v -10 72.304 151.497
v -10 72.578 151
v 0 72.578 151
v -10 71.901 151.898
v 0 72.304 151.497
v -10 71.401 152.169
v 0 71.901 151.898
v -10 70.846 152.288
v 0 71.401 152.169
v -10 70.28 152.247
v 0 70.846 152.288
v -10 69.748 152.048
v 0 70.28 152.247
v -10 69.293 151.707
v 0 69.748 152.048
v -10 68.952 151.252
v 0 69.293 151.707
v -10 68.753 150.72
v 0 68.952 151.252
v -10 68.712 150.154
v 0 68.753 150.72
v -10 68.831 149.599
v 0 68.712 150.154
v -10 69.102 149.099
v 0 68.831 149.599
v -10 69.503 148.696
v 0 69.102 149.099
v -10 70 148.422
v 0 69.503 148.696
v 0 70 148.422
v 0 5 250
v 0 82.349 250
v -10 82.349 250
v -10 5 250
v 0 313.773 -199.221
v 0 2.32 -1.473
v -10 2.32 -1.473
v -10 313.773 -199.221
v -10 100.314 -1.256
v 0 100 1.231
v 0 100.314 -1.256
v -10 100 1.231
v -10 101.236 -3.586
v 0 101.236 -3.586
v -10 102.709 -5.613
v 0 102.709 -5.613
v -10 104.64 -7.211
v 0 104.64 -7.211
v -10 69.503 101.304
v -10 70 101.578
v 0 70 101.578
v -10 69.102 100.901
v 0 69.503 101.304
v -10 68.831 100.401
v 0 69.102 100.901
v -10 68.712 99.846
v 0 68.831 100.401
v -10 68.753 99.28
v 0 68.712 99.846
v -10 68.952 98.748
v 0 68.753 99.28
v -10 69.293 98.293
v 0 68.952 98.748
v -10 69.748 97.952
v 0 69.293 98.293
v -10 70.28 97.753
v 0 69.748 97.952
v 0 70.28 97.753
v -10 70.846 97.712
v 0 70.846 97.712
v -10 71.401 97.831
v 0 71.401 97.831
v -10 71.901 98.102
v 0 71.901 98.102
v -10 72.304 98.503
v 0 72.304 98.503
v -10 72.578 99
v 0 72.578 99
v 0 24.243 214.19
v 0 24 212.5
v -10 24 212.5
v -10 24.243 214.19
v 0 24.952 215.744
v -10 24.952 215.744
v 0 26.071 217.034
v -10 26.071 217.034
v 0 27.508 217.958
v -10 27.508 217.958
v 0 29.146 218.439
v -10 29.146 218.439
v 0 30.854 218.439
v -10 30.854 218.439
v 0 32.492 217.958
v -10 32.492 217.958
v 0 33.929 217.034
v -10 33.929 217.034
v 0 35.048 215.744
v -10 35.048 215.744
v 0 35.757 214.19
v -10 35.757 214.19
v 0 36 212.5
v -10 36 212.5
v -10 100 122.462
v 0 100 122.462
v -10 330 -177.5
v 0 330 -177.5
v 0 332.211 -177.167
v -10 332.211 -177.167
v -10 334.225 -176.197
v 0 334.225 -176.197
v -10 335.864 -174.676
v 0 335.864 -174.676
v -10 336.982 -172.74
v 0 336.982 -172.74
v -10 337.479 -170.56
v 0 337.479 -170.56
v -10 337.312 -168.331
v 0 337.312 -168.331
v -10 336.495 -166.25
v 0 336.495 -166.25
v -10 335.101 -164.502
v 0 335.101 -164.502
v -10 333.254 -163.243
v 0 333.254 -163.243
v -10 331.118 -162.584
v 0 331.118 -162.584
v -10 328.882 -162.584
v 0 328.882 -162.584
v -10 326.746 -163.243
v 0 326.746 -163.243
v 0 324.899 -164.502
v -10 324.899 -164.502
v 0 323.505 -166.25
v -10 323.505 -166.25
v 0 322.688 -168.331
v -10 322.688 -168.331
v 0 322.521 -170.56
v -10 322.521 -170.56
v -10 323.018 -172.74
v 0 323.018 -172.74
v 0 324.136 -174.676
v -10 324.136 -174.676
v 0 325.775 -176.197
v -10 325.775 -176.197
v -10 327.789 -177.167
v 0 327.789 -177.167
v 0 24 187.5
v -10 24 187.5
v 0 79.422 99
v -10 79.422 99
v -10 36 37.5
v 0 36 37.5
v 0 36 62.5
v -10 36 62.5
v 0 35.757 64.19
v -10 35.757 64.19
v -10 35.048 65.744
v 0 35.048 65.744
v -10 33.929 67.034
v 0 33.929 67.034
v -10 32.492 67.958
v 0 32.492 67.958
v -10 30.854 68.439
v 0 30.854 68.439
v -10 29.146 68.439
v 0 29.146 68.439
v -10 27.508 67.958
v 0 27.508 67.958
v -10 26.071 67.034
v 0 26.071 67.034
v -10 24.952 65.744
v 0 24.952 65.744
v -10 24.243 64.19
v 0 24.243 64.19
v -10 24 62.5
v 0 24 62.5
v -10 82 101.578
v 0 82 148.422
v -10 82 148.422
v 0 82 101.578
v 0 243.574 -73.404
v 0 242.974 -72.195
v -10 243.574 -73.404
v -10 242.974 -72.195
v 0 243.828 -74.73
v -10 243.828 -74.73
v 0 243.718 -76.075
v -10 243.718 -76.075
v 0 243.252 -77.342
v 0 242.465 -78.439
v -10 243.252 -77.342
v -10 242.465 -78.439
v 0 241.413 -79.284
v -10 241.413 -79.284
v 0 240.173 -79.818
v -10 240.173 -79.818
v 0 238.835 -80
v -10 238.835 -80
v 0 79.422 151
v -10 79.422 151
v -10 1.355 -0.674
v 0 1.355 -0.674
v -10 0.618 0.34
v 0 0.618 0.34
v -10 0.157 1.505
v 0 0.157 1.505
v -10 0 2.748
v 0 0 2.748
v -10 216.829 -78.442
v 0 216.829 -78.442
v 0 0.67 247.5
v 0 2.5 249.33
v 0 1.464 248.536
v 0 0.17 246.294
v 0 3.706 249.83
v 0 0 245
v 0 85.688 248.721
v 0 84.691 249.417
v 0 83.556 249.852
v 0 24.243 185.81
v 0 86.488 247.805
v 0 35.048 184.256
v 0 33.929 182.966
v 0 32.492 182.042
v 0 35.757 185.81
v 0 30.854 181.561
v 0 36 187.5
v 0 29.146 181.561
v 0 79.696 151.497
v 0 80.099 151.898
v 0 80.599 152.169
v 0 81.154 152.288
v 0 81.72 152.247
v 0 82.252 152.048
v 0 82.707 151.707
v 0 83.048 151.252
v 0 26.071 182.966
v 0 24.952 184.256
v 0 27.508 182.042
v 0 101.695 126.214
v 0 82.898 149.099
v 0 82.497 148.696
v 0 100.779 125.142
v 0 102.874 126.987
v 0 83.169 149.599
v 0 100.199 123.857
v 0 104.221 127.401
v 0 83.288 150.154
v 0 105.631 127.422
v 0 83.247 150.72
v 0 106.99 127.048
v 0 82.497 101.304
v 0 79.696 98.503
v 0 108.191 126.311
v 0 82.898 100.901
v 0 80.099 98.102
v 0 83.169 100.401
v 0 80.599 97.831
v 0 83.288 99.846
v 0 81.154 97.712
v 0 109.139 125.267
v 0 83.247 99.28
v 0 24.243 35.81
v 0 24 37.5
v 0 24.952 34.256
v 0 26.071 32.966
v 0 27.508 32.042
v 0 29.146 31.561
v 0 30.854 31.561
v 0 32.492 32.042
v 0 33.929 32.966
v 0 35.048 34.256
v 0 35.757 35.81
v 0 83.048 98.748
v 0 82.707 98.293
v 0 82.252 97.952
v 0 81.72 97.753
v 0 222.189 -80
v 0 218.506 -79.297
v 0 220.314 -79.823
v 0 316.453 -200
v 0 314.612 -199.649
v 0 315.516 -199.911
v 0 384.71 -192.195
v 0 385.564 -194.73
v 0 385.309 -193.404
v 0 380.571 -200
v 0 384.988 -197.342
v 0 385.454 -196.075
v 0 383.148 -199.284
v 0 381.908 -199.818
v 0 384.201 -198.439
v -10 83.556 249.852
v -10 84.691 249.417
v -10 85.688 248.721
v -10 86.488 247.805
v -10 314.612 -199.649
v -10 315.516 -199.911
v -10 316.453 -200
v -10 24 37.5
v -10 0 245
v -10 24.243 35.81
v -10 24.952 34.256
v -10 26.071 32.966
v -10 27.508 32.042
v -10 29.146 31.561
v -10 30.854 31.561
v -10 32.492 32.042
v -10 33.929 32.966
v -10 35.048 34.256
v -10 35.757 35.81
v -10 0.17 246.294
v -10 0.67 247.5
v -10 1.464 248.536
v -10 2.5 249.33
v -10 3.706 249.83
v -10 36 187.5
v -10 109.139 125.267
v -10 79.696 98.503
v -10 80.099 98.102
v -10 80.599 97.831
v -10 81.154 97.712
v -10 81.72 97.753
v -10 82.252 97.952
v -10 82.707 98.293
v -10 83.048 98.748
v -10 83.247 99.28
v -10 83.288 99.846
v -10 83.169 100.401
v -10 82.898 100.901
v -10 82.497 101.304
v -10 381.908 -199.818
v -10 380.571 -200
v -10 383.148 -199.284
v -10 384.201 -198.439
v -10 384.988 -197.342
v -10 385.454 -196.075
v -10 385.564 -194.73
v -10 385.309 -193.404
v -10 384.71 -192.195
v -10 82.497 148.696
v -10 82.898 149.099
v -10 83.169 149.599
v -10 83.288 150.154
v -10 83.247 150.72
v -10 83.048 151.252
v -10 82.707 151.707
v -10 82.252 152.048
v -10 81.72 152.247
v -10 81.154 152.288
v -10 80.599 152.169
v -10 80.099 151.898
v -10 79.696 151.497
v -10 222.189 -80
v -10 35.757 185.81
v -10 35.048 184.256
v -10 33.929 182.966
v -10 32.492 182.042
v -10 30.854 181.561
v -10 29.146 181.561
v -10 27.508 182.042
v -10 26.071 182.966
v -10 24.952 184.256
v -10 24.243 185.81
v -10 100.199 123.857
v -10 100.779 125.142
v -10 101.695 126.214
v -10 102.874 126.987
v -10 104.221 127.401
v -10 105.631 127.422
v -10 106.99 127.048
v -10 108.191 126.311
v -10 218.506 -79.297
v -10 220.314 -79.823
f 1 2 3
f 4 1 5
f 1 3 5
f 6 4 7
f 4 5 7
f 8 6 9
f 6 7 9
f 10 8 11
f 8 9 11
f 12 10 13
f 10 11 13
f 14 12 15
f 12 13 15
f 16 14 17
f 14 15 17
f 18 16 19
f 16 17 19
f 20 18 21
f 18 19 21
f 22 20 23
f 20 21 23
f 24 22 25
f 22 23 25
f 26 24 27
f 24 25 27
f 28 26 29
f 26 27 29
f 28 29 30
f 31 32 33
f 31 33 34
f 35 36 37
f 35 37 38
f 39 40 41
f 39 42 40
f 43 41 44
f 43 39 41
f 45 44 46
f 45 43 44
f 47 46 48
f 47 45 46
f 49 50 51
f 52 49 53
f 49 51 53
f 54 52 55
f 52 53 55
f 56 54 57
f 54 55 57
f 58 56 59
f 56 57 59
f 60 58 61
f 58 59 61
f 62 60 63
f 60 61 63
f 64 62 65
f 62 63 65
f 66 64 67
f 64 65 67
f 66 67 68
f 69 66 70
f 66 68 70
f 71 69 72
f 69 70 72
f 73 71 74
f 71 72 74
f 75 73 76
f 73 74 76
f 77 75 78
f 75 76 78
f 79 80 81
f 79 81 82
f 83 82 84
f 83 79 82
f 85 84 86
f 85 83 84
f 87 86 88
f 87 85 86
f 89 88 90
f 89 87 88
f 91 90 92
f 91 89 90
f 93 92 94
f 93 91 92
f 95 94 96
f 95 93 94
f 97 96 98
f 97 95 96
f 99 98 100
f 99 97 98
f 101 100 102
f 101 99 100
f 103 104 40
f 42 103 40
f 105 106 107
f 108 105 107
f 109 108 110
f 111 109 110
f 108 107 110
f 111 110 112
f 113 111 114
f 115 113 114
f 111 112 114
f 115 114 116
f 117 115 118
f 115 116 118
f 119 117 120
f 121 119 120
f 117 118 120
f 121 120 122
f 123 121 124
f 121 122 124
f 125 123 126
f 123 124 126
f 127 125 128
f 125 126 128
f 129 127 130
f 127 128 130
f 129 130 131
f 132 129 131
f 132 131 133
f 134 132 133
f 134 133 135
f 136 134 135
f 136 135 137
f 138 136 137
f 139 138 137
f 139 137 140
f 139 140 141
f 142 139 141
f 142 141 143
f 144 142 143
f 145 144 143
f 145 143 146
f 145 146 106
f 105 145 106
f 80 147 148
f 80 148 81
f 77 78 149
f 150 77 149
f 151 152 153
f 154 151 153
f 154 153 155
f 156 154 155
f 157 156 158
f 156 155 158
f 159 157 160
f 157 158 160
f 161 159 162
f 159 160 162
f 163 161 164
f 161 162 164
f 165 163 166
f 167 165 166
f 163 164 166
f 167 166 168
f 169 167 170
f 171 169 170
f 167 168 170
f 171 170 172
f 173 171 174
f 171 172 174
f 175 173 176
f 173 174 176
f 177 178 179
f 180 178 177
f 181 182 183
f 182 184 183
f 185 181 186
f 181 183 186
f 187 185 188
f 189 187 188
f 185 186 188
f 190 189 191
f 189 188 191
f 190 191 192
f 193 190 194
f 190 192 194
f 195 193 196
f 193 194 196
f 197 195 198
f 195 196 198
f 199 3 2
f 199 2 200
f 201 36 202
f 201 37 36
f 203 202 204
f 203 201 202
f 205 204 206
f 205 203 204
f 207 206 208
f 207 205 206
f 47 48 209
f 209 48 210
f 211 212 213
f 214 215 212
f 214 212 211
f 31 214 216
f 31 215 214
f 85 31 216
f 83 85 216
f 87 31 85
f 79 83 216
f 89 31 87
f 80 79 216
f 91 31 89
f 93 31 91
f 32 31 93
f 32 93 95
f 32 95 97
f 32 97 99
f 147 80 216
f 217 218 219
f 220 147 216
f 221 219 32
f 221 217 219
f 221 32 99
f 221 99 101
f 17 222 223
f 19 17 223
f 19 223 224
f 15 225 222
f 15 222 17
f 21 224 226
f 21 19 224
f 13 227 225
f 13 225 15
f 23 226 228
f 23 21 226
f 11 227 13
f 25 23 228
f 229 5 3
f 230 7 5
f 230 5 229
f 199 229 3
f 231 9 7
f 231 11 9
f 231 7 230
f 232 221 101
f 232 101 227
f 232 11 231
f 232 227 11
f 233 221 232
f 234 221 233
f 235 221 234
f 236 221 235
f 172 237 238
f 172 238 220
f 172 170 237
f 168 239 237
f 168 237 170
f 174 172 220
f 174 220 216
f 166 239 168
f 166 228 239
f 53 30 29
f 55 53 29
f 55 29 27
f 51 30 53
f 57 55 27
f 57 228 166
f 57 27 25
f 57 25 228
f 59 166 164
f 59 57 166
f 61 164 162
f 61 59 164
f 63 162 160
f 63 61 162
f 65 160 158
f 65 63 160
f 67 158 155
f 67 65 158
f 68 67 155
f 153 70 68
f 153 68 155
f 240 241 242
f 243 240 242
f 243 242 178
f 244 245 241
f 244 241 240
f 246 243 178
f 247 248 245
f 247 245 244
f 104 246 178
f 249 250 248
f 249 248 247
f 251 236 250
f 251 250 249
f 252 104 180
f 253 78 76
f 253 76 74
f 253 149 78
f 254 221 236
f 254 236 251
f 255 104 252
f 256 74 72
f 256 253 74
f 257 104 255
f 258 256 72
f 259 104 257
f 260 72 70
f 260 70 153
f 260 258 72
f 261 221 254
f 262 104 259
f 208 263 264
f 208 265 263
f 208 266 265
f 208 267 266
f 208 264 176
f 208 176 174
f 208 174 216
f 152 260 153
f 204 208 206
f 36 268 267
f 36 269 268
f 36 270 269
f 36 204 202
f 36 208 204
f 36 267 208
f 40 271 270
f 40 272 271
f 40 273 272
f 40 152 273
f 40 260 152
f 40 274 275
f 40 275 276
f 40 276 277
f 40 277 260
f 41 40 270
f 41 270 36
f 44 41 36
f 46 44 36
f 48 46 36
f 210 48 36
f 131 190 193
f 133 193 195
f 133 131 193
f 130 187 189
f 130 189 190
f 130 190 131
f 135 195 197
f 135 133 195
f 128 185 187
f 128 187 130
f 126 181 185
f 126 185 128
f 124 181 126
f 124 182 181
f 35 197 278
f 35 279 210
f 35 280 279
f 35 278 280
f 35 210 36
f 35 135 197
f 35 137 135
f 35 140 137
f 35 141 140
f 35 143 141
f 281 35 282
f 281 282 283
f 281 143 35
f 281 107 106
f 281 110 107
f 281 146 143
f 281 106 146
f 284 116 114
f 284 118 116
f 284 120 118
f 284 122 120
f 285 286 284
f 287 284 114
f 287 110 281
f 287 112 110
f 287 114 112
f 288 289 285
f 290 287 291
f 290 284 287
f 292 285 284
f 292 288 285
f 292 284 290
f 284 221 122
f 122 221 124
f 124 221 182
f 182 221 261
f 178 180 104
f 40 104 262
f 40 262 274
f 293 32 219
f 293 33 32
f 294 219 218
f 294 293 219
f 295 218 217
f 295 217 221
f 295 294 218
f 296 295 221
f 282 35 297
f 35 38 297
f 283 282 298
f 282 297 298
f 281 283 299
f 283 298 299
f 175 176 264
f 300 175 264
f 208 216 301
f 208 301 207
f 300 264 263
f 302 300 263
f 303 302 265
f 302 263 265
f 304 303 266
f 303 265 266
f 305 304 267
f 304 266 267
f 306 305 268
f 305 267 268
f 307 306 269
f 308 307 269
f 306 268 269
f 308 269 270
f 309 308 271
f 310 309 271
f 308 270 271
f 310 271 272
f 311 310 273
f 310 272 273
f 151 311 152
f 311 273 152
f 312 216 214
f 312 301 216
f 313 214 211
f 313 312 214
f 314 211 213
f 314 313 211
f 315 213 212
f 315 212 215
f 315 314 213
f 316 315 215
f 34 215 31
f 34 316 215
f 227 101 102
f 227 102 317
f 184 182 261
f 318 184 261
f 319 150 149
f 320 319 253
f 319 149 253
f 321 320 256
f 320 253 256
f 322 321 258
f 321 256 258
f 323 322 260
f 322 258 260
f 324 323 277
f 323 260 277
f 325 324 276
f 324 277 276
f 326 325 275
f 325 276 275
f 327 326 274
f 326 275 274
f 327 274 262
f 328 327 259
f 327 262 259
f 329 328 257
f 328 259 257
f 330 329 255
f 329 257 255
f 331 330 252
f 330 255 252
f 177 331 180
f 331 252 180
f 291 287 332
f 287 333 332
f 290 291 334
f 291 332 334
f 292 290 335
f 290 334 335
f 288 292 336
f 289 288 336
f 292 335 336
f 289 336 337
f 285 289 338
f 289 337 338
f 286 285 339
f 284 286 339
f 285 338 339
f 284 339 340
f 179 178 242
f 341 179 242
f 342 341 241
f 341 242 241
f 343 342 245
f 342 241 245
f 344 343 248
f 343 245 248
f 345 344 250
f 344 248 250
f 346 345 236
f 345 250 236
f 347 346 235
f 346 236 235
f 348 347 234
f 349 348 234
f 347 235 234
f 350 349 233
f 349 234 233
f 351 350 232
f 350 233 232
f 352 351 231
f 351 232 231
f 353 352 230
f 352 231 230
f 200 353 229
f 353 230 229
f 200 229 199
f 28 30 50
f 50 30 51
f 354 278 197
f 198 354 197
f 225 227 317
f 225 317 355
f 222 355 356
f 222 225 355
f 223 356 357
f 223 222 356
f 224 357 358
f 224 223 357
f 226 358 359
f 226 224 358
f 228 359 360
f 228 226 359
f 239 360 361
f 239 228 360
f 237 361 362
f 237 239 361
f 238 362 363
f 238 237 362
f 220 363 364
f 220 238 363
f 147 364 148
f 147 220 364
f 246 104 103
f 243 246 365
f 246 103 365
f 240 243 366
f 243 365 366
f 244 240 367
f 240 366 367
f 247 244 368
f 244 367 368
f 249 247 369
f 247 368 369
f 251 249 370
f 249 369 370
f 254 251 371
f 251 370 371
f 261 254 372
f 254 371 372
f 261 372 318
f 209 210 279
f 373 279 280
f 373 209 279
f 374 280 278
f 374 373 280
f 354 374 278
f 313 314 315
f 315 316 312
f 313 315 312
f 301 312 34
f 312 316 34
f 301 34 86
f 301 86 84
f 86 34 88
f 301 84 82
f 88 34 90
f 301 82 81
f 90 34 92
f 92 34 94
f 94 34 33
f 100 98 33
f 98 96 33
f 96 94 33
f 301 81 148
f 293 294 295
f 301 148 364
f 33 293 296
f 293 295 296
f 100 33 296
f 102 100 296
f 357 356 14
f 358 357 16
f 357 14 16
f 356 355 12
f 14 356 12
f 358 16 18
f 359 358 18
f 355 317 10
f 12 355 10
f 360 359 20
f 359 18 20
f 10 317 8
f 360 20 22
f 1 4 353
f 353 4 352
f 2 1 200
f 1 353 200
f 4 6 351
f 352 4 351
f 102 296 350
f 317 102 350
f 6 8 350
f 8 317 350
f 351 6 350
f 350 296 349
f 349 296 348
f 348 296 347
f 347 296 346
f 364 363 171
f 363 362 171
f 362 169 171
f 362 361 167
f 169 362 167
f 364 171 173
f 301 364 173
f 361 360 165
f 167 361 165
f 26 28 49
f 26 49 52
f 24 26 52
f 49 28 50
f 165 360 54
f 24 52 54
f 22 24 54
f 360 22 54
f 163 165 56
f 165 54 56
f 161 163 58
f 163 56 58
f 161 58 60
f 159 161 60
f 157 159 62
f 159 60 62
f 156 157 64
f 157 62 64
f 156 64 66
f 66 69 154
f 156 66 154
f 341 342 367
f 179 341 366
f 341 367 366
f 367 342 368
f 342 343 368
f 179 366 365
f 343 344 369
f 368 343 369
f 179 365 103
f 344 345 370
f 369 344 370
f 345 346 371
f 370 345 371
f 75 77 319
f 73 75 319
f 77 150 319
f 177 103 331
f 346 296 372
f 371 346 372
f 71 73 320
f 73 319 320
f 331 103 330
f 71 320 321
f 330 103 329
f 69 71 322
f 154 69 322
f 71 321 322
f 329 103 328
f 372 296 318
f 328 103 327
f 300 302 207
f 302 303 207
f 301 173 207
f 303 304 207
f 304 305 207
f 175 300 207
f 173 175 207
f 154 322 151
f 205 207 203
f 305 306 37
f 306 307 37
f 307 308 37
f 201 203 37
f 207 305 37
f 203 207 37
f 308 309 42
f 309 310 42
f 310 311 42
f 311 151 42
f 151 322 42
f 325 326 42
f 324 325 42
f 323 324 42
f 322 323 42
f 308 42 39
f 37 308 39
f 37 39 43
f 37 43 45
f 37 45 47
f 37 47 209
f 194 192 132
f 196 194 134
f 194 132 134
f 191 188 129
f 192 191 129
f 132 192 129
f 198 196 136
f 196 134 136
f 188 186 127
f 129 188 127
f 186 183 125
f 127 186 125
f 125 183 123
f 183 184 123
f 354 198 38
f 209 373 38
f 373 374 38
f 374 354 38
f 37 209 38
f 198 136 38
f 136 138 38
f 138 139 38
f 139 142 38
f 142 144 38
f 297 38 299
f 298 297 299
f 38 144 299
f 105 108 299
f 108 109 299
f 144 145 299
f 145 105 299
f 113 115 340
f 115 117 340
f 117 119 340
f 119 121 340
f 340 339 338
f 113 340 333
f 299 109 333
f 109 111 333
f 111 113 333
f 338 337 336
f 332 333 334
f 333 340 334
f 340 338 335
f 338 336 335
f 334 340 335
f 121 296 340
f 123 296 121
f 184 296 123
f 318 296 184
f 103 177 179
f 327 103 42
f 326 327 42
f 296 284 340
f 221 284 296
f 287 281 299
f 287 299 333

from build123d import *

# Parameters (mm, degrees)
BASE_FLANGE1_DEPTH = 10
CUT_EXTRUDE1_DEPTH = 464.357313528
CUT_EXTRUDE2_DEPTH = 464.357313528
FILLET1_R          = 10
FILLET2_R          = 5
SKETCH8_R          = 7.5
CUT_EXTRUDE3_DEPTH = 460.635608137
SKETCH9_W          = 52
SKETCH9_H          = 12
CUT_EXTRUDE4_DEPTH = 460.635608137
SKETCH10_R         = 2
CUT_EXTRUDE5_DEPTH = 460.635608137


# Sheet-metal steps are written as plain solids
with BuildPart() as part:
    # Sketch1 → Base-Flange1 (new body)
    with BuildSketch(Plane(origin=(0, 0, 0), x_dir=(0, 0, -1), z_dir=(1, 0, 0))):
        Polygon((0, 0), (200, 315), (200, 390), (-250, 85), (-250, 0), align=None)
    extrude(amount=-BASE_FLANGE1_DEPTH)

    # Sketch6 → Cut-Extrude1 (cut, through all)
    with BuildSketch(Plane(origin=(0, 0, 0), x_dir=(0, 0, -1), z_dir=(1, 0, 0))):
        with BuildLine():
            Line((-212.5, 36), (-187.5, 36))
            ThreePointArc((-187.5, 36), (-181.5, 30), (-187.5, 24))
            Line((-187.5, 24), (-212.5, 24))
            ThreePointArc((-212.5, 24), (-218.5, 30), (-212.5, 36))
        make_face()
        with BuildLine():
            Line((-37.5, 36), (-62.5, 36))
            ThreePointArc((-62.5, 36), (-68.5, 30), (-62.5, 24))
            Line((-62.5, 24), (-37.5, 24))
            ThreePointArc((-37.5, 24), (-31.5, 30), (-37.5, 36))
        make_face()
    extrude(amount=-CUT_EXTRUDE1_DEPTH, mode=Mode.SUBTRACT)

    # Sketch7 → Cut-Extrude2 (cut, through all)
    with BuildSketch(Plane(origin=(0, 0, 0), x_dir=(0, 0, -1), z_dir=(1, 0, 0))):
        Polygon((80, 248.264209845), (-138.750473541, 100), (4.265291407, 100), (80, 219.282166034), align=None)
    extrude(amount=-CUT_EXTRUDE2_DEPTH, mode=Mode.SUBTRACT)

    # Fillet1
    fillet1_edges = [part.edges().sort_by_distance(p)[0] for p in [
        (-5, 219.282166034, -80),
        (-5, 100, -4.265291407),
    ]]
    fillet(fillet1_edges, radius=FILLET1_R)

    # Fillet2
    fillet2_edges = [part.edges().sort_by_distance(p)[0] for p in [
        (-5, 248.264209845, -80),
        (-5, 100, 138.750473541),
        (-5, 0, 250),
        (-5, 85, 250),
        (-5, 390, -200),
        (-5, 315, -200),
        (-5, 0, 0),
    ]]
    fillet(fillet2_edges, radius=FILLET2_R)

    # Sketch8 → Cut-Extrude3 (cut, through all)
    with BuildSketch(Plane(origin=(0, 0, 0), x_dir=(0, 0, -1), z_dir=(1, 0, 0))):
        with Locations((170, 330)):
            Circle(SKETCH8_R)
    extrude(amount=-CUT_EXTRUDE3_DEPTH, mode=Mode.SUBTRACT)

    # Sketch9 → Cut-Extrude4 (cut, through all)
    with BuildSketch(Plane(origin=(0, 0, 0), x_dir=(0, 0, -1), z_dir=(1, 0, 0))):
        with Locations((-125, 76)):
            Rectangle(SKETCH9_W, SKETCH9_H)
    extrude(amount=-CUT_EXTRUDE4_DEPTH, mode=Mode.SUBTRACT)

    # Sketch10 → Cut-Extrude5 (cut, through all)
    with BuildSketch(Plane(origin=(0, 0, 0), x_dir=(0, 0, -1), z_dir=(1, 0, 0))):
        with Locations((-150.292893219, 70.707106781)):
            Circle(SKETCH10_R)
        with Locations((-150.292893219, 81.292893219)):
            Circle(SKETCH10_R)
        with Locations((-99.707106781, 81.292893219)):
            Circle(SKETCH10_R)
        with Locations((-99.707106781, 70.707106781)):
            Circle(SKETCH10_R)
    extrude(amount=-CUT_EXTRUDE5_DEPTH, mode=Mode.SUBTRACT)


solid = part.part
